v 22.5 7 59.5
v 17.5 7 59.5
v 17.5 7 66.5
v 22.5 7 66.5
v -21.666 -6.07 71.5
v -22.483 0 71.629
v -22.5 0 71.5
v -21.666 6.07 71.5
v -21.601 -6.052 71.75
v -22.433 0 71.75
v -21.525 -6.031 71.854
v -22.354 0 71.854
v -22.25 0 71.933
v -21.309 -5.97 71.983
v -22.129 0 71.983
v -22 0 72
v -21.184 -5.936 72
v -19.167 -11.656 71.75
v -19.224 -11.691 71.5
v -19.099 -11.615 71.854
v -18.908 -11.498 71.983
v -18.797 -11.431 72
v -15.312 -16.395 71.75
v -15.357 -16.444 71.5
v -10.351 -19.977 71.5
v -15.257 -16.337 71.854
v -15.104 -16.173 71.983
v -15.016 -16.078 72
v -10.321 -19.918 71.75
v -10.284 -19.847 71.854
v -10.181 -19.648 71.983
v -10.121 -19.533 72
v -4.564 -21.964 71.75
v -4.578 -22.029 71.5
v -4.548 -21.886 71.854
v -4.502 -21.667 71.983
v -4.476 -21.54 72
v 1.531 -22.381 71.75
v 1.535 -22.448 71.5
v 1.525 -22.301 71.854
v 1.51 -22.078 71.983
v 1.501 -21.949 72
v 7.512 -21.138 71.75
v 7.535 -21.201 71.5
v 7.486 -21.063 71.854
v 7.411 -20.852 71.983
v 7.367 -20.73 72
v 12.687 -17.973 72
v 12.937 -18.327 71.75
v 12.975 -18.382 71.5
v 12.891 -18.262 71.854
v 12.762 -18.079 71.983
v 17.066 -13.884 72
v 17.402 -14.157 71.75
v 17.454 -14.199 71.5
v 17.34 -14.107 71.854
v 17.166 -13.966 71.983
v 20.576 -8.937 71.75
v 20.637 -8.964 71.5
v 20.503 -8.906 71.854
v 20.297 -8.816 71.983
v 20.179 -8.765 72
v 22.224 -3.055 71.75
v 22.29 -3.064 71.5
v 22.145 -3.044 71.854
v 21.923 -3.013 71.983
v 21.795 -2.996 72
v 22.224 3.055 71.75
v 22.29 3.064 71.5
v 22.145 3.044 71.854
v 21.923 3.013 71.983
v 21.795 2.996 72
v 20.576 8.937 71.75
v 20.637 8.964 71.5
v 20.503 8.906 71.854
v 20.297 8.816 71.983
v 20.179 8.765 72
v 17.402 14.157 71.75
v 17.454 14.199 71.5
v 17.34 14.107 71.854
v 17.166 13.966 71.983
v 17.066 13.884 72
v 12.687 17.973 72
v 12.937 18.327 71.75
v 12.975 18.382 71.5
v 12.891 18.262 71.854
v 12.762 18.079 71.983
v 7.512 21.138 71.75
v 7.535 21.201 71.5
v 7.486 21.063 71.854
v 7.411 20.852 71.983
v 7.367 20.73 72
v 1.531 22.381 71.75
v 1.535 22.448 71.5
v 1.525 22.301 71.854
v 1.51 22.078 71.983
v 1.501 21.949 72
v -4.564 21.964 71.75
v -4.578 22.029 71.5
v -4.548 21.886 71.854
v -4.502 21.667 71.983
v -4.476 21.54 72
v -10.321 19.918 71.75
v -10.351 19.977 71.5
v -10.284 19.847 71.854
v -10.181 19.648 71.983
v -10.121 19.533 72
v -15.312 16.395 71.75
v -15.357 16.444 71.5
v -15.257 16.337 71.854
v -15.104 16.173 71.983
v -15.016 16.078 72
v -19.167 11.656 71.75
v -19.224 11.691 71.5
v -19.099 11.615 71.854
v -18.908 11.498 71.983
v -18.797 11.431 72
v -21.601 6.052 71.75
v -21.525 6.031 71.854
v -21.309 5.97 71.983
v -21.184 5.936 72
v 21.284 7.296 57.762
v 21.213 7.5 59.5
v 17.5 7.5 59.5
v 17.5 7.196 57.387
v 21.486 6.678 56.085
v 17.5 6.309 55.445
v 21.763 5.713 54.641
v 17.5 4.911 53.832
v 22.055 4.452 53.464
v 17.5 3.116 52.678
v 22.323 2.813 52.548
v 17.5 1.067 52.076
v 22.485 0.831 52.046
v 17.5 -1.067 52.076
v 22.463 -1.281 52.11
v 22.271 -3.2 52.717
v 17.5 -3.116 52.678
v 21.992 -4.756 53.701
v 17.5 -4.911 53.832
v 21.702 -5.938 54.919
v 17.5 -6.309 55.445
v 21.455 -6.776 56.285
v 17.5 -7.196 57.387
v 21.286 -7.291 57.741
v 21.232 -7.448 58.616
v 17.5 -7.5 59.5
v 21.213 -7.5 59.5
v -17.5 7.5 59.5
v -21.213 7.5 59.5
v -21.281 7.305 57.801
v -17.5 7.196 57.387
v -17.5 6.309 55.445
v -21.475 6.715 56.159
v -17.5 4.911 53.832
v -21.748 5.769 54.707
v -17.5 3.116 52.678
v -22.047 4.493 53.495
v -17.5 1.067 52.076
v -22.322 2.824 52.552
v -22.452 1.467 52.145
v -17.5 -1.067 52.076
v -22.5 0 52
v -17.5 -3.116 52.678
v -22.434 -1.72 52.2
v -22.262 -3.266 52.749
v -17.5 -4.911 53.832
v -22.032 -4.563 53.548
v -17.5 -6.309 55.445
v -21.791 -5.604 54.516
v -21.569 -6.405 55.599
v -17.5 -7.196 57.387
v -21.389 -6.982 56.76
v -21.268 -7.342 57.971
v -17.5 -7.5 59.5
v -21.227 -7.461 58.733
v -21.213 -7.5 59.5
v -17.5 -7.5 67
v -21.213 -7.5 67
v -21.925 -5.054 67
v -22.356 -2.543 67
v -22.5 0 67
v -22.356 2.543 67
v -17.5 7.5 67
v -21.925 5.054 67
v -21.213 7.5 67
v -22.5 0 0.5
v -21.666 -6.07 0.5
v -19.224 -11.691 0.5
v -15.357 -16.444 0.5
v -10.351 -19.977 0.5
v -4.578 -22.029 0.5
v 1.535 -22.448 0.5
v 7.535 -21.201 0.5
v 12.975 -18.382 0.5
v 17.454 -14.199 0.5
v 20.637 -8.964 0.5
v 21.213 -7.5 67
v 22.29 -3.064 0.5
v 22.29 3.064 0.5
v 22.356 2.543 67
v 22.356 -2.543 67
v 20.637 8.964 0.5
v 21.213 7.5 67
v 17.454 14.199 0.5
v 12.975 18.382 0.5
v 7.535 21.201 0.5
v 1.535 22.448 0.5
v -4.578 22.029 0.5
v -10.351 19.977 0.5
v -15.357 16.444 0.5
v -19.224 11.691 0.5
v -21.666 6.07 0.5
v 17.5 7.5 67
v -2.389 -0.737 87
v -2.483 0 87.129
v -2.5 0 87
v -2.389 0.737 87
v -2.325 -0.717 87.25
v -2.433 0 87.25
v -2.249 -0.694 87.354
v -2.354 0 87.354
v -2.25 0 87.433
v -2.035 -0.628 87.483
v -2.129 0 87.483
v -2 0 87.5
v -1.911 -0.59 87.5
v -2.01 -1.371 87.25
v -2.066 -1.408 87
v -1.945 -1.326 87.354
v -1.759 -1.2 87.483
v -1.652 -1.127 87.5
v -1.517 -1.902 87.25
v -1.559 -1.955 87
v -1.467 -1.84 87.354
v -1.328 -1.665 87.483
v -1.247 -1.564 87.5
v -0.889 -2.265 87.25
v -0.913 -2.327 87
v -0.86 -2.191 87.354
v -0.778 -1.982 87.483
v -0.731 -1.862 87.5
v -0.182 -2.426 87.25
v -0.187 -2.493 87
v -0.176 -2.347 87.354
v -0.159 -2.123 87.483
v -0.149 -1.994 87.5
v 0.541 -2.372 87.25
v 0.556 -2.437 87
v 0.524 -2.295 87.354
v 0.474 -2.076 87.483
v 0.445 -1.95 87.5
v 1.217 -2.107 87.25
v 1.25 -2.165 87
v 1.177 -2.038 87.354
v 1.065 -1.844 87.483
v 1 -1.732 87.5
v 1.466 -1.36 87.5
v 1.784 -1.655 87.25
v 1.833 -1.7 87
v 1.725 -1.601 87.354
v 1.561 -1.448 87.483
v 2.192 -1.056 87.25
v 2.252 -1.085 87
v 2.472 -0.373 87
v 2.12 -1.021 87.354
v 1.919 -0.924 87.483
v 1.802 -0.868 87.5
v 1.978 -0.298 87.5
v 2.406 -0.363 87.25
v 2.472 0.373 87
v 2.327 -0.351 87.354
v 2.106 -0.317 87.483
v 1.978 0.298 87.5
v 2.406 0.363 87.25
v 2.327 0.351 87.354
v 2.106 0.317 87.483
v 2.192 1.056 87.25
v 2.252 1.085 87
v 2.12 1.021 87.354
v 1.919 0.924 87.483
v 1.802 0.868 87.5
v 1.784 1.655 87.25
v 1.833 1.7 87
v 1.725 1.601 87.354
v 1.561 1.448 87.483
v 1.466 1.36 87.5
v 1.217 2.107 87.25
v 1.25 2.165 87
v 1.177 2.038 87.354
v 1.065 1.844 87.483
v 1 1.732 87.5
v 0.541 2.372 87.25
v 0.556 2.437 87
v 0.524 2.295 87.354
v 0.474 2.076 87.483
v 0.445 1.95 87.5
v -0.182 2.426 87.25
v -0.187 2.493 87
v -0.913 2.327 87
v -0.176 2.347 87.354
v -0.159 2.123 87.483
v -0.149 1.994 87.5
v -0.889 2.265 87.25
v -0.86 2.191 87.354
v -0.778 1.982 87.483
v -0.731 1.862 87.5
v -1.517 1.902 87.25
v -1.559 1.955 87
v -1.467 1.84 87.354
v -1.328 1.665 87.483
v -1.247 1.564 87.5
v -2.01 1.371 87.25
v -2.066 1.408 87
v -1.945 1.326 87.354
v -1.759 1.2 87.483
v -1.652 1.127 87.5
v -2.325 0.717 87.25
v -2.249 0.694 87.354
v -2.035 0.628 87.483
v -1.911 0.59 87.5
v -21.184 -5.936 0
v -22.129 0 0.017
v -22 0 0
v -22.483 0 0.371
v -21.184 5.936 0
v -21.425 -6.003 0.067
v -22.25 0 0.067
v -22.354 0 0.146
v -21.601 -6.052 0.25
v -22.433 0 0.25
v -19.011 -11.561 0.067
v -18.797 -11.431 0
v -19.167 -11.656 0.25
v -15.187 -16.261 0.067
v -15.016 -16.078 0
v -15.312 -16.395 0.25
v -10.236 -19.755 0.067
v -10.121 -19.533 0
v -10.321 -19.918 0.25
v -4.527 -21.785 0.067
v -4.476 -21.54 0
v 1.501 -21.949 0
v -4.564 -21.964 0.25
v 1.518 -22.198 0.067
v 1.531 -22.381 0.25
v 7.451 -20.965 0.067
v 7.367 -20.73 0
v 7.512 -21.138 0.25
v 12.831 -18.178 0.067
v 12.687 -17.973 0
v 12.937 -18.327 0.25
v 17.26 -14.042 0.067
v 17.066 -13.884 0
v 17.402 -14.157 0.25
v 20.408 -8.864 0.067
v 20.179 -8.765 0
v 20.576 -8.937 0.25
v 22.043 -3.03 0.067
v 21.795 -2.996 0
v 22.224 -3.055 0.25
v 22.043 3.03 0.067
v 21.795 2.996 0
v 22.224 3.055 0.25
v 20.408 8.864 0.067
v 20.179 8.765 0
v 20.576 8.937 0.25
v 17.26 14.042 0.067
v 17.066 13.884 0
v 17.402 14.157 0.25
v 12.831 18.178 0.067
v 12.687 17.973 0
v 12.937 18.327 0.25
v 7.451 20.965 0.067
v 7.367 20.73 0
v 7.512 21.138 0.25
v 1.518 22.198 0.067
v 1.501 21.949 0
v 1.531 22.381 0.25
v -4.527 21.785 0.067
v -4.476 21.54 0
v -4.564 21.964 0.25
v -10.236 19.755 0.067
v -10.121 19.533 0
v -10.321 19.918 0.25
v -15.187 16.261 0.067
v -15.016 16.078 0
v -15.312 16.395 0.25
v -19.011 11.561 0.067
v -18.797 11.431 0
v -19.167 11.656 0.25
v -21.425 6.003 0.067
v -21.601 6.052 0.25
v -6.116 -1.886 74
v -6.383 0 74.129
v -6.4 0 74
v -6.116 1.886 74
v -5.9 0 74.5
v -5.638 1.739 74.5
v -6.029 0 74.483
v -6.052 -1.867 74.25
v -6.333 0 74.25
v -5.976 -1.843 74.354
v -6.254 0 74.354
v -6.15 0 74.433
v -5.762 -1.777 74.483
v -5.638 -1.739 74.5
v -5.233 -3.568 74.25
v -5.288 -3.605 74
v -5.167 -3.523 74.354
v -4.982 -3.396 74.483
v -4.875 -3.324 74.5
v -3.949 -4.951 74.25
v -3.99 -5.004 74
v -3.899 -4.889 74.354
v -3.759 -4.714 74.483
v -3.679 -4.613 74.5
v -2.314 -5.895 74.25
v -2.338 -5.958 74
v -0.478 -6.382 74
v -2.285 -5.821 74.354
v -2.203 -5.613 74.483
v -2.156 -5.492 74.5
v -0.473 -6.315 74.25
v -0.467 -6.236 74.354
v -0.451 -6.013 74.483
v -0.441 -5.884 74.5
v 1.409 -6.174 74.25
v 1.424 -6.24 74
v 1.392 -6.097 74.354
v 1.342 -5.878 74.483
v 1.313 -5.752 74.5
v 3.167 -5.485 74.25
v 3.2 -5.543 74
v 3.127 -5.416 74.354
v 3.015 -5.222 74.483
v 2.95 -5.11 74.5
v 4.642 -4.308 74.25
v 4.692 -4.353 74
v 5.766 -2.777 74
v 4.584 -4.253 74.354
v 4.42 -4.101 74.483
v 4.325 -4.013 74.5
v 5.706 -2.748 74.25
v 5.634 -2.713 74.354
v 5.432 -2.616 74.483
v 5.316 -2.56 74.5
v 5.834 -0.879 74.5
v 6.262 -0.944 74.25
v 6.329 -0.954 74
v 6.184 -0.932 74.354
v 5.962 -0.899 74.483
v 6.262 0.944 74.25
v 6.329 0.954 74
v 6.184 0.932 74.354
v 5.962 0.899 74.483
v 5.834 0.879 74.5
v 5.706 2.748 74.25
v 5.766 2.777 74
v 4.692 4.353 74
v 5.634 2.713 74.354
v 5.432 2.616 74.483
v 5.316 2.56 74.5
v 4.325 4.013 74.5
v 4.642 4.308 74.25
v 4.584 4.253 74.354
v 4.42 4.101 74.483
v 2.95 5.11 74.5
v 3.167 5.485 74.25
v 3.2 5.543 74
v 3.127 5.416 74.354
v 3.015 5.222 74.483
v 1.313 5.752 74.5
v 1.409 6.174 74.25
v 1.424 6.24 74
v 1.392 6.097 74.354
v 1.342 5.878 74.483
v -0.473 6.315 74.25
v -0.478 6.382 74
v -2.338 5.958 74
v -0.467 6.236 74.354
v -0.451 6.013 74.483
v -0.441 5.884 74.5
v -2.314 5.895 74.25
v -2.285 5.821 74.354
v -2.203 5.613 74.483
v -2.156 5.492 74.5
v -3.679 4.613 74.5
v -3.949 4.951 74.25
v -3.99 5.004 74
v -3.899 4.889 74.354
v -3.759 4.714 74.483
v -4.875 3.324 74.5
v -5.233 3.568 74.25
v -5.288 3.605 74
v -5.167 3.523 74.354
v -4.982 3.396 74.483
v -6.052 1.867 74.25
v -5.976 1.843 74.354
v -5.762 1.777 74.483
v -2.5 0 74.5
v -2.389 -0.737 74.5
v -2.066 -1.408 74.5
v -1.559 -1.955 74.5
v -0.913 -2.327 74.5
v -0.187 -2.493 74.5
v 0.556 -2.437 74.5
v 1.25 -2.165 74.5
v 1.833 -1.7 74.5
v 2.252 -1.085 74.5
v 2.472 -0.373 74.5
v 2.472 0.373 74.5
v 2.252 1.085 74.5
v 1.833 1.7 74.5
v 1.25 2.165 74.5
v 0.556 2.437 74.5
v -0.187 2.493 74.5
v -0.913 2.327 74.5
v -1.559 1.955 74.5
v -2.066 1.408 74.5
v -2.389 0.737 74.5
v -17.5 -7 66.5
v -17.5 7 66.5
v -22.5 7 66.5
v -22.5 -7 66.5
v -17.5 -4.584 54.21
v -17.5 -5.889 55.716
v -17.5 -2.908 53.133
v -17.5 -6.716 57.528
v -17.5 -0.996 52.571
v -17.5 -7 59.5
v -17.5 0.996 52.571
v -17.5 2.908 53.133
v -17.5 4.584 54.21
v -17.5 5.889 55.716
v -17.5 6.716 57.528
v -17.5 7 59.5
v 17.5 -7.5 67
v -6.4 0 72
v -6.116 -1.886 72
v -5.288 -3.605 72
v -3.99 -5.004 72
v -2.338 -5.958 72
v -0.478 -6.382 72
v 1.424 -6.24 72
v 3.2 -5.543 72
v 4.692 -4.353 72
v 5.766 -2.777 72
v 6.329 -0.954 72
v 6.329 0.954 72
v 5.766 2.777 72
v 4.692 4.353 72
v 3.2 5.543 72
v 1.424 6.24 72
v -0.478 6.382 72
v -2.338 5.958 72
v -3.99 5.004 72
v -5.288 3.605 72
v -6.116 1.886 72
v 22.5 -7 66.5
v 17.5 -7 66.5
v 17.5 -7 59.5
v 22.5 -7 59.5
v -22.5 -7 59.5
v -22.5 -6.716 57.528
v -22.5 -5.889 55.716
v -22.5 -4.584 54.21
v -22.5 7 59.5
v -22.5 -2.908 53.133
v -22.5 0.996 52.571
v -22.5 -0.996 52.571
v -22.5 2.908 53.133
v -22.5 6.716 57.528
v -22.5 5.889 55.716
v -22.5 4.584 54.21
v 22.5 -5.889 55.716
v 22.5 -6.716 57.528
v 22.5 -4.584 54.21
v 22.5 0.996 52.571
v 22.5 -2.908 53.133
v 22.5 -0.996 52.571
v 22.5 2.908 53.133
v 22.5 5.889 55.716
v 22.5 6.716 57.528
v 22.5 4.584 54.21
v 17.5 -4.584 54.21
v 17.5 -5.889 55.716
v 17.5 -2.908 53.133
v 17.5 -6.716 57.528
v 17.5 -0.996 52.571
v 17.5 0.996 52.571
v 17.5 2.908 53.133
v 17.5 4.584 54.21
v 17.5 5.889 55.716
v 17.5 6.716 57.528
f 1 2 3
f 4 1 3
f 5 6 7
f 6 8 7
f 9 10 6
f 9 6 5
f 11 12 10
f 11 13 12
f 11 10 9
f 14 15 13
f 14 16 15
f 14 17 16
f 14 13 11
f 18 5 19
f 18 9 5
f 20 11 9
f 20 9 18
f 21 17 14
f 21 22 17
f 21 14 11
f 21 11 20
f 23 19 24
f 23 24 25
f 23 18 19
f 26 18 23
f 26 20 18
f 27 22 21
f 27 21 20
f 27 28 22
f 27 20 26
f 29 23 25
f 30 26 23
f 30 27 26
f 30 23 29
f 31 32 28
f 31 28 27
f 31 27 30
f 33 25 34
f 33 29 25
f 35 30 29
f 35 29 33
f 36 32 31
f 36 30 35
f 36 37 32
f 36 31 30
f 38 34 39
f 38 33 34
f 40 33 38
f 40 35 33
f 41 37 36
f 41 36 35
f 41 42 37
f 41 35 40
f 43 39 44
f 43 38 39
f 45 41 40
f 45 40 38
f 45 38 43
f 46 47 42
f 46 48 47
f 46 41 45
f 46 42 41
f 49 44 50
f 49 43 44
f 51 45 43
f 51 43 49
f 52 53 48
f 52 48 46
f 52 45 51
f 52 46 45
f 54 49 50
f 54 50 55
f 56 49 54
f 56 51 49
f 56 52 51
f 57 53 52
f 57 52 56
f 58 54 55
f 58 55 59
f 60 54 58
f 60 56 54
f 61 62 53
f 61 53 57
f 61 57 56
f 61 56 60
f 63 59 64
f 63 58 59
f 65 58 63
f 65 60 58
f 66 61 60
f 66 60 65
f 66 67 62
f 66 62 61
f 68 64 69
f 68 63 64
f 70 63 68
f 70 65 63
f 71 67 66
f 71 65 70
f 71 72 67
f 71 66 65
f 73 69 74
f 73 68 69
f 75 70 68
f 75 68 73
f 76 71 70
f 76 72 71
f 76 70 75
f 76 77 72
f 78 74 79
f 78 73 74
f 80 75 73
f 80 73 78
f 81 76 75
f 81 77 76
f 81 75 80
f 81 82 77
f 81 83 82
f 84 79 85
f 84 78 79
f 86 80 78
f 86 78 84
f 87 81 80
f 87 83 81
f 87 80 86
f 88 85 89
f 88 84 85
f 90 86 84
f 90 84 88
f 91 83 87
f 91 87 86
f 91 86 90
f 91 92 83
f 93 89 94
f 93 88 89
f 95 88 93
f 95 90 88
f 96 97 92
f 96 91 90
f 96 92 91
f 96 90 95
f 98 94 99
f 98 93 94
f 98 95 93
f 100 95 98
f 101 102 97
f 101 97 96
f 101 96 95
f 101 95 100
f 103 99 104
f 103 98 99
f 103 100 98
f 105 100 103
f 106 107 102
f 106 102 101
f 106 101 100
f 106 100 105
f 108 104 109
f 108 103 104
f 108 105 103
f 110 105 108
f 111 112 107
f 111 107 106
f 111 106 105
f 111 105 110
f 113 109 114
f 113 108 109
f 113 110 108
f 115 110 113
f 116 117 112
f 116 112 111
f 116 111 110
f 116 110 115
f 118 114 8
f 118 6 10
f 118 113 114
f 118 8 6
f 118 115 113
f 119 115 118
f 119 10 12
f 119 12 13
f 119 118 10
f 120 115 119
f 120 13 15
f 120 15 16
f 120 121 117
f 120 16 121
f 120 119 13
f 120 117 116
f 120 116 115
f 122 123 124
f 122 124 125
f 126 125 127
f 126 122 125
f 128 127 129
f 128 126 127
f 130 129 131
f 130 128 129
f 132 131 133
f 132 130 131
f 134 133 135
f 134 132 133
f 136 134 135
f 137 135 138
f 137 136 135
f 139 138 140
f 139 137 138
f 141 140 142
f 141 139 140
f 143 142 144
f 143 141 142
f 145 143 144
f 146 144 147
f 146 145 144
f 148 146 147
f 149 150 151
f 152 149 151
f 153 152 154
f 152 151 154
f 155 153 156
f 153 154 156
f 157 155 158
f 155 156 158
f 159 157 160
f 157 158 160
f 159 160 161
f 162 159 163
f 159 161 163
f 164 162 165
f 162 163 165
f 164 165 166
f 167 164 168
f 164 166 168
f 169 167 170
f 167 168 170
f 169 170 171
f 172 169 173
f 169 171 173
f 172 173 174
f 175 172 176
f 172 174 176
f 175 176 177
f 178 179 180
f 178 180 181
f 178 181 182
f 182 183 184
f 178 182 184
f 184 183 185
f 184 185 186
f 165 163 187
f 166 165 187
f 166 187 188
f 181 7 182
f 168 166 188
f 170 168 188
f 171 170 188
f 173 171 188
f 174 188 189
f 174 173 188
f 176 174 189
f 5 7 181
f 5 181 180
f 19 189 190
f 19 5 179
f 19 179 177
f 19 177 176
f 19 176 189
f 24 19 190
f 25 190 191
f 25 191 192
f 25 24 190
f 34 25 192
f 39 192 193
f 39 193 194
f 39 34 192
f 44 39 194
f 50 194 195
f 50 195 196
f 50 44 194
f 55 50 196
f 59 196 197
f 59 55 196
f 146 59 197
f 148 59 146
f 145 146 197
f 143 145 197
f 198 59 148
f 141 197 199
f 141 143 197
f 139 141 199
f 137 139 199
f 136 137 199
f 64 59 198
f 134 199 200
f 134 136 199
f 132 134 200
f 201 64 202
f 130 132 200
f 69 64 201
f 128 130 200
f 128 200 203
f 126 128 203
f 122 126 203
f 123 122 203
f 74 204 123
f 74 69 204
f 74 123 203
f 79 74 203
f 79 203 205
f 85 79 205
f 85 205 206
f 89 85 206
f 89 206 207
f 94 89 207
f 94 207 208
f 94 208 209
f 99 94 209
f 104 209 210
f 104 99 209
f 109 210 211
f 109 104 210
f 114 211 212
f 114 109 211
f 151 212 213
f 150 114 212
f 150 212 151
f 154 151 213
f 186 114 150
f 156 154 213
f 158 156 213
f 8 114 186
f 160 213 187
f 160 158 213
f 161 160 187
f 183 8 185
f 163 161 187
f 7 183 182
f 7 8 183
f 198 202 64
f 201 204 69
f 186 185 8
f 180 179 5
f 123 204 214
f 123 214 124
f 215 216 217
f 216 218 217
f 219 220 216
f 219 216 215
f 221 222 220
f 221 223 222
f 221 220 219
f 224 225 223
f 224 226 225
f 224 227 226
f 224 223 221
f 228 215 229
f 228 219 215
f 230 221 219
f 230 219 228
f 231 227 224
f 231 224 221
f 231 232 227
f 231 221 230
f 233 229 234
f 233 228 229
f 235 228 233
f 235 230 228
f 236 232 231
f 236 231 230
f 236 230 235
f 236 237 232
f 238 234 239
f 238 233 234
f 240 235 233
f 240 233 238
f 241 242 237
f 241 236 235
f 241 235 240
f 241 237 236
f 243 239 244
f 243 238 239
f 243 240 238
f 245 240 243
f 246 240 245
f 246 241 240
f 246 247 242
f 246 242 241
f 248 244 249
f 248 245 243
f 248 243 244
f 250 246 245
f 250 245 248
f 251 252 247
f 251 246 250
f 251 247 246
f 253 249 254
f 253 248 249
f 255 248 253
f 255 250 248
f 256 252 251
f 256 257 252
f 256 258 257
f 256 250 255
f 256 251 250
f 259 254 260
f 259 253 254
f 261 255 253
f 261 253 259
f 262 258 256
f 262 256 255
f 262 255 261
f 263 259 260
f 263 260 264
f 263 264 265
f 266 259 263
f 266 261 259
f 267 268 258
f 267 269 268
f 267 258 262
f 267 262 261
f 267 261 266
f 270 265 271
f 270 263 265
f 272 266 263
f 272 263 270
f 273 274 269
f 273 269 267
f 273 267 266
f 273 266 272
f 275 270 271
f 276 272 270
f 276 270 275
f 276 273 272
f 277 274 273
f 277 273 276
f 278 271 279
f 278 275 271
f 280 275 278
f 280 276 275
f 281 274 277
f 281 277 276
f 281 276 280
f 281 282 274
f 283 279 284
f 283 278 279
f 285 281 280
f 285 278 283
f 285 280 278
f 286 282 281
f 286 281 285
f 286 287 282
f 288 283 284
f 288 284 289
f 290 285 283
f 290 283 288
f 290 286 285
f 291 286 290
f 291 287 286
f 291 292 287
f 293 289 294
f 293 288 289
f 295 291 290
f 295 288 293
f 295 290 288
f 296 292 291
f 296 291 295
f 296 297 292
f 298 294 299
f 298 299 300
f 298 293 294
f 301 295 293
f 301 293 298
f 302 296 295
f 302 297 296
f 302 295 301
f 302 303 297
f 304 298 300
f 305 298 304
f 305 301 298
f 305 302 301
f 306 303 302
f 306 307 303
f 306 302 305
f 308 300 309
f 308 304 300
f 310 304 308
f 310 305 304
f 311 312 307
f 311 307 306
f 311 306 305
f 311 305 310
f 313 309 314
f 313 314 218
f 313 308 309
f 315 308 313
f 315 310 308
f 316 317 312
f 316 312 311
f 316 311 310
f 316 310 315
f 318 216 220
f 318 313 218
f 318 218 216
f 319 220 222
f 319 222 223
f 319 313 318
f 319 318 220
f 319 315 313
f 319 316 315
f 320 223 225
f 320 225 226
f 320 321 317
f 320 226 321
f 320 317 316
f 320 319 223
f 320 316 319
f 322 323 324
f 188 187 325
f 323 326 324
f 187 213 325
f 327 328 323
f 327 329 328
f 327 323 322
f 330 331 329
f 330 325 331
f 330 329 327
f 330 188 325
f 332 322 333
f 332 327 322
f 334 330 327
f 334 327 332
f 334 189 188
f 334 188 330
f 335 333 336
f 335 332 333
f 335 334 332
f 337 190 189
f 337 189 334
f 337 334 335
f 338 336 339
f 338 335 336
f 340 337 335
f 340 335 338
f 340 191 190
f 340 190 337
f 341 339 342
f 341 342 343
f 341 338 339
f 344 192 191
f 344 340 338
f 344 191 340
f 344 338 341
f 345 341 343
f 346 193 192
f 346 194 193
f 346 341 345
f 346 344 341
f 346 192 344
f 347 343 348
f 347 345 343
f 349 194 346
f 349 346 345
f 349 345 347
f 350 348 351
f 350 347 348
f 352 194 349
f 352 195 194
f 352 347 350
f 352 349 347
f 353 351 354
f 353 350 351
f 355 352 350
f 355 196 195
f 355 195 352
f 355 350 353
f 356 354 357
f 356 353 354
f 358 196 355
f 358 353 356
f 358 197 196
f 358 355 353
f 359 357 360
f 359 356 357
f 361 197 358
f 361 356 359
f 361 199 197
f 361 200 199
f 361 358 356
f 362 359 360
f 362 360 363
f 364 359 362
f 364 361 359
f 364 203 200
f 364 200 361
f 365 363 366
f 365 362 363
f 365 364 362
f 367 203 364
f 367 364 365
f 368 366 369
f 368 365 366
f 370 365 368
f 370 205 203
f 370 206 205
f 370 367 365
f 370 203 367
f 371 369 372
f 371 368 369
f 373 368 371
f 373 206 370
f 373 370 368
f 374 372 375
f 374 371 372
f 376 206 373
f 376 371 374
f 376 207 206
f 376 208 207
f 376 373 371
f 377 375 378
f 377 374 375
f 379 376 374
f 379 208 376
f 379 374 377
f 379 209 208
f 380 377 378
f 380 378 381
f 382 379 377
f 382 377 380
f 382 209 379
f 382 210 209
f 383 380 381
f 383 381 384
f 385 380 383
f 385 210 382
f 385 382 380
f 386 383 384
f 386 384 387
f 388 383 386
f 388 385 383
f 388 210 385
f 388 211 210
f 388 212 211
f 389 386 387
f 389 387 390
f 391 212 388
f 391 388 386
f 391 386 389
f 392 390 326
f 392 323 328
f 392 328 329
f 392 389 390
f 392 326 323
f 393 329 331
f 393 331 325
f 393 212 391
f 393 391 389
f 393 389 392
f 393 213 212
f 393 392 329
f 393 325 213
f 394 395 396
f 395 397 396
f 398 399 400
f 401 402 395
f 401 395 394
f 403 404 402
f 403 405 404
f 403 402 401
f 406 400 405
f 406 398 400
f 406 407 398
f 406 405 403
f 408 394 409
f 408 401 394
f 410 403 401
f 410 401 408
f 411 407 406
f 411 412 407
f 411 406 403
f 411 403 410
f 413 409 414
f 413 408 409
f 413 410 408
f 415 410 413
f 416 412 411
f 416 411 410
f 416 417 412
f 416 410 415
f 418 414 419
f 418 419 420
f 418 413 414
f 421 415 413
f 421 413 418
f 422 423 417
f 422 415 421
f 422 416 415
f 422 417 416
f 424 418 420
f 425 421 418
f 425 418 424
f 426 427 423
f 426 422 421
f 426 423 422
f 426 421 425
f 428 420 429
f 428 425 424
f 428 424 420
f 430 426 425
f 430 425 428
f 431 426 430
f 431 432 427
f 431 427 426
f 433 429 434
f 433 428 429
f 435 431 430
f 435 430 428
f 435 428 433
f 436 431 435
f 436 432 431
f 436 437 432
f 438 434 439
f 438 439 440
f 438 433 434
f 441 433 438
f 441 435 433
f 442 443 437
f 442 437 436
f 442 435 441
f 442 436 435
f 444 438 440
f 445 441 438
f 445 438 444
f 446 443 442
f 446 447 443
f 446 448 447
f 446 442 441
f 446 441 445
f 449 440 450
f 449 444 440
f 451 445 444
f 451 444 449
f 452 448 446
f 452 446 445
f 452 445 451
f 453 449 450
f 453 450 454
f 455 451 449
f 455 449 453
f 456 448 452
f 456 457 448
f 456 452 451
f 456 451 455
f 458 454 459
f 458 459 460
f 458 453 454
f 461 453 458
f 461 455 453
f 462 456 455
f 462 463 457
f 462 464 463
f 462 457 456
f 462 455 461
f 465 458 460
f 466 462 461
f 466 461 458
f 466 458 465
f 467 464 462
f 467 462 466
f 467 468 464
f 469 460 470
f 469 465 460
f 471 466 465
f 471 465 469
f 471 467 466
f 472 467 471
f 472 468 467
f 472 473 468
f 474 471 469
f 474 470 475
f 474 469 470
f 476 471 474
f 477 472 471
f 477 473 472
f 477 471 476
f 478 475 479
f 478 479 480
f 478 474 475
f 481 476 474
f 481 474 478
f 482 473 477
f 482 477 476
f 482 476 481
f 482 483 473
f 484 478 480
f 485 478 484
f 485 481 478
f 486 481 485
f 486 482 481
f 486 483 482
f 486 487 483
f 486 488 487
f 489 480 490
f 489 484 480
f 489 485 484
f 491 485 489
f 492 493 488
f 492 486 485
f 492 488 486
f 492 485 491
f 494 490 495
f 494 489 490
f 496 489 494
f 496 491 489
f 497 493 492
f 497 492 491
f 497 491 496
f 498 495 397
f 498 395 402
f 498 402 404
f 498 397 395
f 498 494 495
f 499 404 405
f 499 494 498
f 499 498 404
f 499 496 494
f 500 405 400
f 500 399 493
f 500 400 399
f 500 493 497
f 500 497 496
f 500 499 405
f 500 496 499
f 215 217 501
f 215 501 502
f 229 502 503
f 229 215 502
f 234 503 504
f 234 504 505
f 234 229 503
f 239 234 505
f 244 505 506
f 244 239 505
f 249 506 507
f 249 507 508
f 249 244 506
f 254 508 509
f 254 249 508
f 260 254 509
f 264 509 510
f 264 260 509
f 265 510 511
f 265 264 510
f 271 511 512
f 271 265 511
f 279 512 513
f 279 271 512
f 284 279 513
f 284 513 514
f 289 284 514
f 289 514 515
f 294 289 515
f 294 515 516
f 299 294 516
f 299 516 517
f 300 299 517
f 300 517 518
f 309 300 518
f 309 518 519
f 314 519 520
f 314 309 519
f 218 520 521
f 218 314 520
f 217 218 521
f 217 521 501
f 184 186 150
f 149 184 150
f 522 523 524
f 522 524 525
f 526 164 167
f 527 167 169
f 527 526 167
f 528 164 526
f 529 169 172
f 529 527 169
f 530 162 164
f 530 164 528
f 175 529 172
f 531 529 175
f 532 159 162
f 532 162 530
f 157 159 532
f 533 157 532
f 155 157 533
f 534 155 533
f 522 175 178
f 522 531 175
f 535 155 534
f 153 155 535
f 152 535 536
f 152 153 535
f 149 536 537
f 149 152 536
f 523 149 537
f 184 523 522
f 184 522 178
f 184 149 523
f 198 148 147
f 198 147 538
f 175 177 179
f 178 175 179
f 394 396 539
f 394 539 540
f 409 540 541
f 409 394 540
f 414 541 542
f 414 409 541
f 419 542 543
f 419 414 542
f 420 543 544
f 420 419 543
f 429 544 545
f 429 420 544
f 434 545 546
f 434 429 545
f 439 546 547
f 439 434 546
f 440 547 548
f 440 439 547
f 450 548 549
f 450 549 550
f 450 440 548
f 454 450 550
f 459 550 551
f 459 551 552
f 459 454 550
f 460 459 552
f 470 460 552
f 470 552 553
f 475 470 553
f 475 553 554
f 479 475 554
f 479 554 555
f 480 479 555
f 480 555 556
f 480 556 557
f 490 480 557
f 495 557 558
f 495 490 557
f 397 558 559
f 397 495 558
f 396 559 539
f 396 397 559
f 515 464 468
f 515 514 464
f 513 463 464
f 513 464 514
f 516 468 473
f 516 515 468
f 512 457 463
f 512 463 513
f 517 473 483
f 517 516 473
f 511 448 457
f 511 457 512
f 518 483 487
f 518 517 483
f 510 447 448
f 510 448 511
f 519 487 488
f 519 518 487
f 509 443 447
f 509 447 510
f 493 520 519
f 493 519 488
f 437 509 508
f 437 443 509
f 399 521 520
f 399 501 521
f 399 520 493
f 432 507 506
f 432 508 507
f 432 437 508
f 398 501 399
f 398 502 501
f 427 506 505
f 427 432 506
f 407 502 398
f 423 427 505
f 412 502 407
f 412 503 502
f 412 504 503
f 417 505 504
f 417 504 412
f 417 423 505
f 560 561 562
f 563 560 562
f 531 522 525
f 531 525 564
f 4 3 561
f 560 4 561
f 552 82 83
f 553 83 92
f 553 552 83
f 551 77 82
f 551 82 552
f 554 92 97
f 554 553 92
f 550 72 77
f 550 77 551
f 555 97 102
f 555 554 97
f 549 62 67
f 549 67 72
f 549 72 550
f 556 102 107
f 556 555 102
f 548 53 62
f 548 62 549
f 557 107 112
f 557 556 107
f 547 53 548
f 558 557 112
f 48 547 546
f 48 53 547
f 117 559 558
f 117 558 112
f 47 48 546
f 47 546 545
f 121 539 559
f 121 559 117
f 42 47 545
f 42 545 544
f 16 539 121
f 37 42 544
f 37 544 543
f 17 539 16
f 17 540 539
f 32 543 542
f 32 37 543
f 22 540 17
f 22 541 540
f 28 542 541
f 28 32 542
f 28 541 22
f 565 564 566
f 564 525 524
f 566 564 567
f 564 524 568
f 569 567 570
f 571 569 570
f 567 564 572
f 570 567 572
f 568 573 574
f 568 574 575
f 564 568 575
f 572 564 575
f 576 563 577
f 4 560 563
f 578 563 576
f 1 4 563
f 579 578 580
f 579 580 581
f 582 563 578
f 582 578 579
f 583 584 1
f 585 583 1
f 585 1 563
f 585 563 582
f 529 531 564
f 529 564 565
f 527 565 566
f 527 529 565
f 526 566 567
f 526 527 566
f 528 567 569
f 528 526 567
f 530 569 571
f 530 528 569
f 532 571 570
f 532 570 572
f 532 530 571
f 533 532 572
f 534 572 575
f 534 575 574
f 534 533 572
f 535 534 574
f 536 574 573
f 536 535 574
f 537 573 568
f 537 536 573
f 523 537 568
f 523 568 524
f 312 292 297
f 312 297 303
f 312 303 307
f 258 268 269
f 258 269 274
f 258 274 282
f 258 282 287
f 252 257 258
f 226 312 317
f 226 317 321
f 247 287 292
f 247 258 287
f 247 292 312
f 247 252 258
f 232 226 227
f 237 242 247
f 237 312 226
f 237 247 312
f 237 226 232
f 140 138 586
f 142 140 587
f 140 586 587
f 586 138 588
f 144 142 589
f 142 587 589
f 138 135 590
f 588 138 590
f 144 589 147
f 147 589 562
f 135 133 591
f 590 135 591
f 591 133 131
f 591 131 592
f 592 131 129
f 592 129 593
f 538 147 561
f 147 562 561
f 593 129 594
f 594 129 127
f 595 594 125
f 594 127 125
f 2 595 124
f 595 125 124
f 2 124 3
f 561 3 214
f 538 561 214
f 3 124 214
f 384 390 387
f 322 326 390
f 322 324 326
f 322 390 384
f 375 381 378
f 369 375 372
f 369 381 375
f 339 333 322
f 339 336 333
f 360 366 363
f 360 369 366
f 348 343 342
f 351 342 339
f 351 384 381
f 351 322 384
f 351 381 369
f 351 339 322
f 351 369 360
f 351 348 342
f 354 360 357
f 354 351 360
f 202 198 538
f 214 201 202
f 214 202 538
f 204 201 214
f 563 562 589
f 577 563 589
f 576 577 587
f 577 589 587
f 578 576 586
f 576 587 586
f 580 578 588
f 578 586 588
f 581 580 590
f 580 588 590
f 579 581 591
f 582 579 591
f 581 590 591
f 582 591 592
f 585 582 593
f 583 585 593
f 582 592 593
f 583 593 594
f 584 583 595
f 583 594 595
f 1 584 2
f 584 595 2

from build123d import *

# Parameters (mm, degrees)
FILLET1_R           = 0.5
CUT_EXTRUDE1_DEPTH  = 5
BOSS_EXTRUDE1_DEPTH = 5


with BuildPart() as part:
    # Sketch1 → Revolve1 (revolve)
    with BuildSketch(Plane(origin=(0, 0, 0), x_dir=(0, 0, -1), z_dir=(1, 0, 0)), mode=Mode.PRIVATE) as revolve1_sk:
        Polygon((0, 0), (0, 22.5), (-72, 22.5), (-72, 6.4), (-74.5, 6.4), (-74.5, 2.5), (-87.5, 2.5), (-87.5, 0), align=None)
    revolve(revolve1_sk.sketch.rotate(Axis((0, 0, 0), (0, 0, 1)), 90), axis=Axis((0, 0, 0), (0, 0, 1)))

    # Fillet1
    fillet1_edges = [part.edges().sort_by_distance(p)[0] for p in [
        (2.5, 0, 87.5),
        (6.4, 0, 74.5),
        (22.5, 0, 72),
        (22.5, 0, 0),
    ]]
    fillet(fillet1_edges, radius=FILLET1_R)

    # Sketch3 → Cut-Extrude1 (cut)
    with BuildSketch(Plane(origin=(22.5, 0, 0), x_dir=(0, 0, -1), z_dir=(1, 0, 0))):
        with BuildLine():
            Line((-67, -7.5), (-67, 7.5))
            Line((-67, 7.5), (-59.5, 7.5))
            ThreePointArc((-59.5, 7.5), (-52, 0), (-59.5, -7.5))
            Line((-59.5, -7.5), (-67, -7.5))
        make_face()
    cut_extrude1 = extrude(amount=-CUT_EXTRUDE1_DEPTH, mode=Mode.SUBTRACT)

    # Sketch4 → Boss-Extrude1 (add)
    with BuildSketch(Plane(origin=(17.5, 0, 0), x_dir=(0, 0, -1), z_dir=(1, 0, 0))):
        with BuildLine():
            Line((-66.5, -7), (-59.5, -7))
            ThreePointArc((-59.5, -7), (-52.5, 0), (-59.5, 7))
            Line((-59.5, 7), (-66.5, 7))
            Line((-66.5, 7), (-66.5, -7))
        make_face()
    boss_extrude1 = extrude(amount=BOSS_EXTRUDE1_DEPTH)

    # Mirror1: Cut-Extrude1, Boss-Extrude1 across plane
    add(cut_extrude1.mirror(Plane(origin=(0, 0, 0), x_dir=(0, 0, 1), z_dir=(1, 0, 0))), mode=Mode.SUBTRACT)
    add(boss_extrude1.mirror(Plane(origin=(0, 0, 0), x_dir=(0, 0, 1), z_dir=(1, 0, 0))))


solid = part.part
